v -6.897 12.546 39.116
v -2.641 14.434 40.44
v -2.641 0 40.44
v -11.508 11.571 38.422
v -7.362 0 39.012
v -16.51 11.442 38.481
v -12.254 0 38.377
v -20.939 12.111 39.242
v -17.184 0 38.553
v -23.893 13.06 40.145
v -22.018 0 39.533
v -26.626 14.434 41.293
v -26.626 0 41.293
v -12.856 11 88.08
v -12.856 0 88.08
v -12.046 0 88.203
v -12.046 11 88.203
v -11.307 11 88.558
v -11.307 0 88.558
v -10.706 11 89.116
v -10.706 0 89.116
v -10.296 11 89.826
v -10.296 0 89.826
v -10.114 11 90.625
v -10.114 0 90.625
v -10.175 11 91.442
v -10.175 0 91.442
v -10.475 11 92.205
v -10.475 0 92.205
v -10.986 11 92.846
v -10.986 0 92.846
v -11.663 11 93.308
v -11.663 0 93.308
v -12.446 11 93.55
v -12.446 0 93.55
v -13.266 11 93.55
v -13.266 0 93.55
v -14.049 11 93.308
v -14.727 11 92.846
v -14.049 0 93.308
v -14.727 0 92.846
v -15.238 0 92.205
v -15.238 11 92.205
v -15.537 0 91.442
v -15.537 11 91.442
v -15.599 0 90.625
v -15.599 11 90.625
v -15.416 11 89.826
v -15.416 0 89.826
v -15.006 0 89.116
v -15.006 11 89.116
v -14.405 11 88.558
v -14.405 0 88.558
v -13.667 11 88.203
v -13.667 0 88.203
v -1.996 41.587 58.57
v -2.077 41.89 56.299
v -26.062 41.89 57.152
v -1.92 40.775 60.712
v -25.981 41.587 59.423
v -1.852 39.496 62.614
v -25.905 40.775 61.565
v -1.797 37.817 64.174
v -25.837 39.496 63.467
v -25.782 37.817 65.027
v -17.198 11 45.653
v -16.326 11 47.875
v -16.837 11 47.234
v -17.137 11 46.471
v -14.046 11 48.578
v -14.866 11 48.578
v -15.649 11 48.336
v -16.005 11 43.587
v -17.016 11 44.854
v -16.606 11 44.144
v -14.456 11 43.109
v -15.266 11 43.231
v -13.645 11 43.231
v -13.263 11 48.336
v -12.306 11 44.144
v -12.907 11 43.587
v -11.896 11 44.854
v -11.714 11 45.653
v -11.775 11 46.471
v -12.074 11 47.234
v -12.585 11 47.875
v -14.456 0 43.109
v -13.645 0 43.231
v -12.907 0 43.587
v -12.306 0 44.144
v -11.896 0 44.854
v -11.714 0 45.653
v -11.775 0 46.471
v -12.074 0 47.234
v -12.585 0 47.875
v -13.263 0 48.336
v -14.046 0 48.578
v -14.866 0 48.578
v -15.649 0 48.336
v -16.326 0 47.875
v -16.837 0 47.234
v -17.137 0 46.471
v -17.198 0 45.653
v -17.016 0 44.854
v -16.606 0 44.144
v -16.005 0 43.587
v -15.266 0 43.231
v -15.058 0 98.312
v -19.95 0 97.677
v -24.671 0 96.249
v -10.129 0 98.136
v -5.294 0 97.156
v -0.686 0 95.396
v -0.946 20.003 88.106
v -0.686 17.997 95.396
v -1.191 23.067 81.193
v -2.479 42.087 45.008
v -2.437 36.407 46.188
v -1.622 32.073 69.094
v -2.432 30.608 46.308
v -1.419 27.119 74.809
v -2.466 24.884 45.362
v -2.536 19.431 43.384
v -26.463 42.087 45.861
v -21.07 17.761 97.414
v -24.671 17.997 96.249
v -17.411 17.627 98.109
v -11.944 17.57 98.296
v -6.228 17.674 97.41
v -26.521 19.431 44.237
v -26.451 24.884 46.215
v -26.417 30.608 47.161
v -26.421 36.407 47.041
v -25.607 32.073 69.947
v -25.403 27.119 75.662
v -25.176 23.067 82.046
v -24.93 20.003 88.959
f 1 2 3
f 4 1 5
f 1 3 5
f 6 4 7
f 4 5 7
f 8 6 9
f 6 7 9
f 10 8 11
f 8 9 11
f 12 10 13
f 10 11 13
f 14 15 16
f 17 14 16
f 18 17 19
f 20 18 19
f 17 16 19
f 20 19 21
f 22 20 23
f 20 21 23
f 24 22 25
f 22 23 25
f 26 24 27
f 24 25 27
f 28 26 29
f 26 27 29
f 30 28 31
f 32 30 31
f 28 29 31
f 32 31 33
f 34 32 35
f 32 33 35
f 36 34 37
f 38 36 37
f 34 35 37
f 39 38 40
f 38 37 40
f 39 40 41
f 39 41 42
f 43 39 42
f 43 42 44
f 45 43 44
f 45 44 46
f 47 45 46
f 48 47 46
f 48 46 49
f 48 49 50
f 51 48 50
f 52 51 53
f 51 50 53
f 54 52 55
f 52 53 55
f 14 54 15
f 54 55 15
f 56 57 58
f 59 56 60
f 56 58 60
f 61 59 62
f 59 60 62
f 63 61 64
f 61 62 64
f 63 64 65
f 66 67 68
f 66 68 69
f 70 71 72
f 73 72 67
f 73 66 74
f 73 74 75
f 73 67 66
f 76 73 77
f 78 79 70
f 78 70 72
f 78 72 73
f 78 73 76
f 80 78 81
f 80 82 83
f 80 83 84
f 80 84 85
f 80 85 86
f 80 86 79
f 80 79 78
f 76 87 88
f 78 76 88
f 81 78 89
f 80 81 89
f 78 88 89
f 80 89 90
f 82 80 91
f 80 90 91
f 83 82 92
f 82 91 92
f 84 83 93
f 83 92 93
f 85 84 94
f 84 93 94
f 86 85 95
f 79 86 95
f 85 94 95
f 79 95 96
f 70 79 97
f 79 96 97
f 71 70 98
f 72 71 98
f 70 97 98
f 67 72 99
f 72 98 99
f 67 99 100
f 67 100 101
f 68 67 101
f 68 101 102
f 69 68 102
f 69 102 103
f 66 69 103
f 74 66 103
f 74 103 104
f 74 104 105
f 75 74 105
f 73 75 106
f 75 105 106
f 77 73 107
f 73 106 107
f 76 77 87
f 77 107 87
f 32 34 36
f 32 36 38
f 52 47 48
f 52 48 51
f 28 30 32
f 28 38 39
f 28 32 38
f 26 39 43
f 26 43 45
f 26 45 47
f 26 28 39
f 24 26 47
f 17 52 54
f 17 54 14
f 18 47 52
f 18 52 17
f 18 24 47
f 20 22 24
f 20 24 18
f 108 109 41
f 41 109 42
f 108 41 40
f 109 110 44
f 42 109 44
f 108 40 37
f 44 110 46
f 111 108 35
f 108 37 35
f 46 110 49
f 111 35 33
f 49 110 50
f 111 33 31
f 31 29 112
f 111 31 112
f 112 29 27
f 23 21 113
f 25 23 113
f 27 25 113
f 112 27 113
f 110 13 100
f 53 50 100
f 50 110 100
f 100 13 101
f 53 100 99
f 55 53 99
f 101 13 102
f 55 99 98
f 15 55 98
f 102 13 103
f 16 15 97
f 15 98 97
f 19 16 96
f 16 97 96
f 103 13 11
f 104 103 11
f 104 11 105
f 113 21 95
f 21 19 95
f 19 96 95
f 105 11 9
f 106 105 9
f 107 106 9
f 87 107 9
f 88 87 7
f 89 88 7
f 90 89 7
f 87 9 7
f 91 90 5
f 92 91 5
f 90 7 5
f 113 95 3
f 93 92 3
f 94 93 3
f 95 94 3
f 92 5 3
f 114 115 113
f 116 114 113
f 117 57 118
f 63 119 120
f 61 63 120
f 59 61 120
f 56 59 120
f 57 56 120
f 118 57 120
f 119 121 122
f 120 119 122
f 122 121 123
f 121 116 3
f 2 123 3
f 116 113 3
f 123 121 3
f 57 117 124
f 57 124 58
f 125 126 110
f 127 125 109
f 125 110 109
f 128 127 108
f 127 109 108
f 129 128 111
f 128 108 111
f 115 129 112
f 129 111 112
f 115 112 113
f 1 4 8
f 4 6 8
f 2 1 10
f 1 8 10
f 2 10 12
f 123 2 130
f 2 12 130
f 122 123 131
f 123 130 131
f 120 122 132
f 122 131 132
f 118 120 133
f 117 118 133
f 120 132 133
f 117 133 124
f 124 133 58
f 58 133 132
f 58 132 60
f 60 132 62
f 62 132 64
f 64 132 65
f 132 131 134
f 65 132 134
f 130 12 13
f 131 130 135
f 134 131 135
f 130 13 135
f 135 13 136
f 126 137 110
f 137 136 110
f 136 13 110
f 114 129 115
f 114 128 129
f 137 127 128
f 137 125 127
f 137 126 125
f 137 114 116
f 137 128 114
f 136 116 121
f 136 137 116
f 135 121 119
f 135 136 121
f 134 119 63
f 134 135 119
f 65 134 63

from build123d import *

# Parameters (mm, degrees)
BOSS_EXTRUDE1_DEPTH   = 17.569451358
BOSS_EXTRUDE1_START   = 17.569451358
BOSS_EXTRUDE1_2_DEPTH = 46.858135107
BOSS_EXTRUDE1_START_2 = -28.07685133
BOSS_EXTRUDE1_3_DEPTH = 23.999999999
CUT_EXTRUDE4_DEPTH    = 110
CUT_EXTRUDE5_DEPTH    = 110
SKETCH7_R             = 2.75
CUT_EXTRUDE6_DEPTH    = 11


with BuildPart() as part:
    # Boss-Extrude1: read off the stored shape, not the designer's step
    # Boss-Extrude1 outline → Boss-Extrude1 (new body)
    with BuildSketch(Plane(origin=(0, 0, 0), x_dir=(1, 0, 0), z_dir=(0, 1, 0))):
        with BuildLine():
            ThreePointArc((-24.671127501, -96.249224292), (-12.589683548, -98.325630278), (-0.686294869, -95.396110217))
            Line((-0.686294869, -95.396110217), (-2.641024782, -40.439954684))
            ThreePointArc((-2.641024782, -40.439954684), (-14.722468735, -38.363548698), (-26.625857414, -41.293068759))
            Line((-26.625857414, -41.293068759), (-24.671127501, -96.249224292))
        make_face()
    extrude(amount=BOSS_EXTRUDE1_DEPTH)

    # Boss-Extrude1 2 outline → Boss-Extrude1 2 (add)
    with BuildSketch(Plane(origin=(0, 0, 0), x_dir=(1, 0, 0), z_dir=(0, 1, 0)).offset(BOSS_EXTRUDE1_START)):
        with BuildLine():
            ThreePointArc((-2.641024782, -40.439954684), (-14.722468735, -38.363548698), (-26.625857414, -41.293068759))
            Line((-26.625857414, -41.293068759), (-24.671127501, -96.249224292))
            ThreePointArc((-24.671127501, -96.249224292), (-12.589683548, -98.325630278), (-0.686294869, -95.396110217))
            Line((-0.686294869, -95.396110217), (-2.641024782, -40.439954684))
        make_face()
    extrude(amount=BOSS_EXTRUDE1_2_DEPTH)

    # Boss-Extrude1 3 outline → Boss-Extrude1 3 (cut)
    with BuildSketch(Plane(origin=(0, 0, 0), x_dir=(0, 1, 0), z_dir=(0.9993680263239928, 0, -0.03554641980970049)).offset(BOSS_EXTRUDE1_START_2)):
        with BuildLine():
            ThreePointArc((17.569338406, 97.816751997), (33.324720821, 67.788721809), (64.427586465, 54.27848788))
            Line((64.427586465, 54.27848788), (64.427586465, 99))
            Line((64.427586465, 99), (17.39740303, 99))
            Line((17.39740303, 99), (17.569338406, 97.816751997))
        make_face()
    extrude(amount=BOSS_EXTRUDE1_3_DEPTH, mode=Mode.SUBTRACT)

    # Sketch5 → Cut-Extrude4 (cut)
    with BuildSketch(Plane(origin=(-28.0591075, 0, 0.998031544), x_dir=(0.035546419809700254, 0, 0.9993680263239927), z_dir=(-0.9993680263239927, 0, 0.035546419809700254))):
        with BuildLine():
            Line((44.891420837, 42.087012188), (56.189188936, 41.889808912))
            ThreePointArc((56.189188936, 41.889808912), (60.605735593, 40.775141371), (64.069709996, 37.817228352))
            Line((64.069709996, 37.817228352), (71.315646663, 80.984453669))
            Line((71.315646663, 80.984453669), (32.067670376, 80.984453669))
            Line((32.067670376, 80.984453669), (32.067670376, 59.188710826))
            ThreePointArc((32.067670376, 59.188710826), (39.974518446, 51.75887054), (44.891420837, 42.087012188))
        make_face()
    extrude(amount=-CUT_EXTRUDE4_DEPTH, mode=Mode.SUBTRACT)

    # Sketch6 → Cut-Extrude5 (cut)
    with BuildSketch(Plane(origin=(-28.0591075, 0, 0.998031544), x_dir=(0.035546419809700254, 0, 0.9993680263239927), z_dir=(-0.9993680263239927, 0, 0.035546419809700254))):
        with BuildLine():
            Line((27.29032593, 61.767303304), (29.792054549, 5.172444286))
            ThreePointArc((29.792054549, 5.172444286), (46.242002949, 34.252323482), (27.29032593, 61.767303304))
        make_face()
    extrude(amount=-CUT_EXTRUDE5_DEPTH, mode=Mode.SUBTRACT)

    # Sketch7 → Cut-Extrude6 (cut)
    with BuildSketch(Plane.XZ):
        with Locations(Location((-14.455870587, 45.858808896, 0), (0, 0, 270))):
            Circle(SKETCH7_R)
        with Locations(Location((-12.856281696, 90.83037008, 0), (0, 0, 270))):
            Circle(SKETCH7_R)
    extrude(amount=-CUT_EXTRUDE6_DEPTH, mode=Mode.SUBTRACT)


solid = part.part
